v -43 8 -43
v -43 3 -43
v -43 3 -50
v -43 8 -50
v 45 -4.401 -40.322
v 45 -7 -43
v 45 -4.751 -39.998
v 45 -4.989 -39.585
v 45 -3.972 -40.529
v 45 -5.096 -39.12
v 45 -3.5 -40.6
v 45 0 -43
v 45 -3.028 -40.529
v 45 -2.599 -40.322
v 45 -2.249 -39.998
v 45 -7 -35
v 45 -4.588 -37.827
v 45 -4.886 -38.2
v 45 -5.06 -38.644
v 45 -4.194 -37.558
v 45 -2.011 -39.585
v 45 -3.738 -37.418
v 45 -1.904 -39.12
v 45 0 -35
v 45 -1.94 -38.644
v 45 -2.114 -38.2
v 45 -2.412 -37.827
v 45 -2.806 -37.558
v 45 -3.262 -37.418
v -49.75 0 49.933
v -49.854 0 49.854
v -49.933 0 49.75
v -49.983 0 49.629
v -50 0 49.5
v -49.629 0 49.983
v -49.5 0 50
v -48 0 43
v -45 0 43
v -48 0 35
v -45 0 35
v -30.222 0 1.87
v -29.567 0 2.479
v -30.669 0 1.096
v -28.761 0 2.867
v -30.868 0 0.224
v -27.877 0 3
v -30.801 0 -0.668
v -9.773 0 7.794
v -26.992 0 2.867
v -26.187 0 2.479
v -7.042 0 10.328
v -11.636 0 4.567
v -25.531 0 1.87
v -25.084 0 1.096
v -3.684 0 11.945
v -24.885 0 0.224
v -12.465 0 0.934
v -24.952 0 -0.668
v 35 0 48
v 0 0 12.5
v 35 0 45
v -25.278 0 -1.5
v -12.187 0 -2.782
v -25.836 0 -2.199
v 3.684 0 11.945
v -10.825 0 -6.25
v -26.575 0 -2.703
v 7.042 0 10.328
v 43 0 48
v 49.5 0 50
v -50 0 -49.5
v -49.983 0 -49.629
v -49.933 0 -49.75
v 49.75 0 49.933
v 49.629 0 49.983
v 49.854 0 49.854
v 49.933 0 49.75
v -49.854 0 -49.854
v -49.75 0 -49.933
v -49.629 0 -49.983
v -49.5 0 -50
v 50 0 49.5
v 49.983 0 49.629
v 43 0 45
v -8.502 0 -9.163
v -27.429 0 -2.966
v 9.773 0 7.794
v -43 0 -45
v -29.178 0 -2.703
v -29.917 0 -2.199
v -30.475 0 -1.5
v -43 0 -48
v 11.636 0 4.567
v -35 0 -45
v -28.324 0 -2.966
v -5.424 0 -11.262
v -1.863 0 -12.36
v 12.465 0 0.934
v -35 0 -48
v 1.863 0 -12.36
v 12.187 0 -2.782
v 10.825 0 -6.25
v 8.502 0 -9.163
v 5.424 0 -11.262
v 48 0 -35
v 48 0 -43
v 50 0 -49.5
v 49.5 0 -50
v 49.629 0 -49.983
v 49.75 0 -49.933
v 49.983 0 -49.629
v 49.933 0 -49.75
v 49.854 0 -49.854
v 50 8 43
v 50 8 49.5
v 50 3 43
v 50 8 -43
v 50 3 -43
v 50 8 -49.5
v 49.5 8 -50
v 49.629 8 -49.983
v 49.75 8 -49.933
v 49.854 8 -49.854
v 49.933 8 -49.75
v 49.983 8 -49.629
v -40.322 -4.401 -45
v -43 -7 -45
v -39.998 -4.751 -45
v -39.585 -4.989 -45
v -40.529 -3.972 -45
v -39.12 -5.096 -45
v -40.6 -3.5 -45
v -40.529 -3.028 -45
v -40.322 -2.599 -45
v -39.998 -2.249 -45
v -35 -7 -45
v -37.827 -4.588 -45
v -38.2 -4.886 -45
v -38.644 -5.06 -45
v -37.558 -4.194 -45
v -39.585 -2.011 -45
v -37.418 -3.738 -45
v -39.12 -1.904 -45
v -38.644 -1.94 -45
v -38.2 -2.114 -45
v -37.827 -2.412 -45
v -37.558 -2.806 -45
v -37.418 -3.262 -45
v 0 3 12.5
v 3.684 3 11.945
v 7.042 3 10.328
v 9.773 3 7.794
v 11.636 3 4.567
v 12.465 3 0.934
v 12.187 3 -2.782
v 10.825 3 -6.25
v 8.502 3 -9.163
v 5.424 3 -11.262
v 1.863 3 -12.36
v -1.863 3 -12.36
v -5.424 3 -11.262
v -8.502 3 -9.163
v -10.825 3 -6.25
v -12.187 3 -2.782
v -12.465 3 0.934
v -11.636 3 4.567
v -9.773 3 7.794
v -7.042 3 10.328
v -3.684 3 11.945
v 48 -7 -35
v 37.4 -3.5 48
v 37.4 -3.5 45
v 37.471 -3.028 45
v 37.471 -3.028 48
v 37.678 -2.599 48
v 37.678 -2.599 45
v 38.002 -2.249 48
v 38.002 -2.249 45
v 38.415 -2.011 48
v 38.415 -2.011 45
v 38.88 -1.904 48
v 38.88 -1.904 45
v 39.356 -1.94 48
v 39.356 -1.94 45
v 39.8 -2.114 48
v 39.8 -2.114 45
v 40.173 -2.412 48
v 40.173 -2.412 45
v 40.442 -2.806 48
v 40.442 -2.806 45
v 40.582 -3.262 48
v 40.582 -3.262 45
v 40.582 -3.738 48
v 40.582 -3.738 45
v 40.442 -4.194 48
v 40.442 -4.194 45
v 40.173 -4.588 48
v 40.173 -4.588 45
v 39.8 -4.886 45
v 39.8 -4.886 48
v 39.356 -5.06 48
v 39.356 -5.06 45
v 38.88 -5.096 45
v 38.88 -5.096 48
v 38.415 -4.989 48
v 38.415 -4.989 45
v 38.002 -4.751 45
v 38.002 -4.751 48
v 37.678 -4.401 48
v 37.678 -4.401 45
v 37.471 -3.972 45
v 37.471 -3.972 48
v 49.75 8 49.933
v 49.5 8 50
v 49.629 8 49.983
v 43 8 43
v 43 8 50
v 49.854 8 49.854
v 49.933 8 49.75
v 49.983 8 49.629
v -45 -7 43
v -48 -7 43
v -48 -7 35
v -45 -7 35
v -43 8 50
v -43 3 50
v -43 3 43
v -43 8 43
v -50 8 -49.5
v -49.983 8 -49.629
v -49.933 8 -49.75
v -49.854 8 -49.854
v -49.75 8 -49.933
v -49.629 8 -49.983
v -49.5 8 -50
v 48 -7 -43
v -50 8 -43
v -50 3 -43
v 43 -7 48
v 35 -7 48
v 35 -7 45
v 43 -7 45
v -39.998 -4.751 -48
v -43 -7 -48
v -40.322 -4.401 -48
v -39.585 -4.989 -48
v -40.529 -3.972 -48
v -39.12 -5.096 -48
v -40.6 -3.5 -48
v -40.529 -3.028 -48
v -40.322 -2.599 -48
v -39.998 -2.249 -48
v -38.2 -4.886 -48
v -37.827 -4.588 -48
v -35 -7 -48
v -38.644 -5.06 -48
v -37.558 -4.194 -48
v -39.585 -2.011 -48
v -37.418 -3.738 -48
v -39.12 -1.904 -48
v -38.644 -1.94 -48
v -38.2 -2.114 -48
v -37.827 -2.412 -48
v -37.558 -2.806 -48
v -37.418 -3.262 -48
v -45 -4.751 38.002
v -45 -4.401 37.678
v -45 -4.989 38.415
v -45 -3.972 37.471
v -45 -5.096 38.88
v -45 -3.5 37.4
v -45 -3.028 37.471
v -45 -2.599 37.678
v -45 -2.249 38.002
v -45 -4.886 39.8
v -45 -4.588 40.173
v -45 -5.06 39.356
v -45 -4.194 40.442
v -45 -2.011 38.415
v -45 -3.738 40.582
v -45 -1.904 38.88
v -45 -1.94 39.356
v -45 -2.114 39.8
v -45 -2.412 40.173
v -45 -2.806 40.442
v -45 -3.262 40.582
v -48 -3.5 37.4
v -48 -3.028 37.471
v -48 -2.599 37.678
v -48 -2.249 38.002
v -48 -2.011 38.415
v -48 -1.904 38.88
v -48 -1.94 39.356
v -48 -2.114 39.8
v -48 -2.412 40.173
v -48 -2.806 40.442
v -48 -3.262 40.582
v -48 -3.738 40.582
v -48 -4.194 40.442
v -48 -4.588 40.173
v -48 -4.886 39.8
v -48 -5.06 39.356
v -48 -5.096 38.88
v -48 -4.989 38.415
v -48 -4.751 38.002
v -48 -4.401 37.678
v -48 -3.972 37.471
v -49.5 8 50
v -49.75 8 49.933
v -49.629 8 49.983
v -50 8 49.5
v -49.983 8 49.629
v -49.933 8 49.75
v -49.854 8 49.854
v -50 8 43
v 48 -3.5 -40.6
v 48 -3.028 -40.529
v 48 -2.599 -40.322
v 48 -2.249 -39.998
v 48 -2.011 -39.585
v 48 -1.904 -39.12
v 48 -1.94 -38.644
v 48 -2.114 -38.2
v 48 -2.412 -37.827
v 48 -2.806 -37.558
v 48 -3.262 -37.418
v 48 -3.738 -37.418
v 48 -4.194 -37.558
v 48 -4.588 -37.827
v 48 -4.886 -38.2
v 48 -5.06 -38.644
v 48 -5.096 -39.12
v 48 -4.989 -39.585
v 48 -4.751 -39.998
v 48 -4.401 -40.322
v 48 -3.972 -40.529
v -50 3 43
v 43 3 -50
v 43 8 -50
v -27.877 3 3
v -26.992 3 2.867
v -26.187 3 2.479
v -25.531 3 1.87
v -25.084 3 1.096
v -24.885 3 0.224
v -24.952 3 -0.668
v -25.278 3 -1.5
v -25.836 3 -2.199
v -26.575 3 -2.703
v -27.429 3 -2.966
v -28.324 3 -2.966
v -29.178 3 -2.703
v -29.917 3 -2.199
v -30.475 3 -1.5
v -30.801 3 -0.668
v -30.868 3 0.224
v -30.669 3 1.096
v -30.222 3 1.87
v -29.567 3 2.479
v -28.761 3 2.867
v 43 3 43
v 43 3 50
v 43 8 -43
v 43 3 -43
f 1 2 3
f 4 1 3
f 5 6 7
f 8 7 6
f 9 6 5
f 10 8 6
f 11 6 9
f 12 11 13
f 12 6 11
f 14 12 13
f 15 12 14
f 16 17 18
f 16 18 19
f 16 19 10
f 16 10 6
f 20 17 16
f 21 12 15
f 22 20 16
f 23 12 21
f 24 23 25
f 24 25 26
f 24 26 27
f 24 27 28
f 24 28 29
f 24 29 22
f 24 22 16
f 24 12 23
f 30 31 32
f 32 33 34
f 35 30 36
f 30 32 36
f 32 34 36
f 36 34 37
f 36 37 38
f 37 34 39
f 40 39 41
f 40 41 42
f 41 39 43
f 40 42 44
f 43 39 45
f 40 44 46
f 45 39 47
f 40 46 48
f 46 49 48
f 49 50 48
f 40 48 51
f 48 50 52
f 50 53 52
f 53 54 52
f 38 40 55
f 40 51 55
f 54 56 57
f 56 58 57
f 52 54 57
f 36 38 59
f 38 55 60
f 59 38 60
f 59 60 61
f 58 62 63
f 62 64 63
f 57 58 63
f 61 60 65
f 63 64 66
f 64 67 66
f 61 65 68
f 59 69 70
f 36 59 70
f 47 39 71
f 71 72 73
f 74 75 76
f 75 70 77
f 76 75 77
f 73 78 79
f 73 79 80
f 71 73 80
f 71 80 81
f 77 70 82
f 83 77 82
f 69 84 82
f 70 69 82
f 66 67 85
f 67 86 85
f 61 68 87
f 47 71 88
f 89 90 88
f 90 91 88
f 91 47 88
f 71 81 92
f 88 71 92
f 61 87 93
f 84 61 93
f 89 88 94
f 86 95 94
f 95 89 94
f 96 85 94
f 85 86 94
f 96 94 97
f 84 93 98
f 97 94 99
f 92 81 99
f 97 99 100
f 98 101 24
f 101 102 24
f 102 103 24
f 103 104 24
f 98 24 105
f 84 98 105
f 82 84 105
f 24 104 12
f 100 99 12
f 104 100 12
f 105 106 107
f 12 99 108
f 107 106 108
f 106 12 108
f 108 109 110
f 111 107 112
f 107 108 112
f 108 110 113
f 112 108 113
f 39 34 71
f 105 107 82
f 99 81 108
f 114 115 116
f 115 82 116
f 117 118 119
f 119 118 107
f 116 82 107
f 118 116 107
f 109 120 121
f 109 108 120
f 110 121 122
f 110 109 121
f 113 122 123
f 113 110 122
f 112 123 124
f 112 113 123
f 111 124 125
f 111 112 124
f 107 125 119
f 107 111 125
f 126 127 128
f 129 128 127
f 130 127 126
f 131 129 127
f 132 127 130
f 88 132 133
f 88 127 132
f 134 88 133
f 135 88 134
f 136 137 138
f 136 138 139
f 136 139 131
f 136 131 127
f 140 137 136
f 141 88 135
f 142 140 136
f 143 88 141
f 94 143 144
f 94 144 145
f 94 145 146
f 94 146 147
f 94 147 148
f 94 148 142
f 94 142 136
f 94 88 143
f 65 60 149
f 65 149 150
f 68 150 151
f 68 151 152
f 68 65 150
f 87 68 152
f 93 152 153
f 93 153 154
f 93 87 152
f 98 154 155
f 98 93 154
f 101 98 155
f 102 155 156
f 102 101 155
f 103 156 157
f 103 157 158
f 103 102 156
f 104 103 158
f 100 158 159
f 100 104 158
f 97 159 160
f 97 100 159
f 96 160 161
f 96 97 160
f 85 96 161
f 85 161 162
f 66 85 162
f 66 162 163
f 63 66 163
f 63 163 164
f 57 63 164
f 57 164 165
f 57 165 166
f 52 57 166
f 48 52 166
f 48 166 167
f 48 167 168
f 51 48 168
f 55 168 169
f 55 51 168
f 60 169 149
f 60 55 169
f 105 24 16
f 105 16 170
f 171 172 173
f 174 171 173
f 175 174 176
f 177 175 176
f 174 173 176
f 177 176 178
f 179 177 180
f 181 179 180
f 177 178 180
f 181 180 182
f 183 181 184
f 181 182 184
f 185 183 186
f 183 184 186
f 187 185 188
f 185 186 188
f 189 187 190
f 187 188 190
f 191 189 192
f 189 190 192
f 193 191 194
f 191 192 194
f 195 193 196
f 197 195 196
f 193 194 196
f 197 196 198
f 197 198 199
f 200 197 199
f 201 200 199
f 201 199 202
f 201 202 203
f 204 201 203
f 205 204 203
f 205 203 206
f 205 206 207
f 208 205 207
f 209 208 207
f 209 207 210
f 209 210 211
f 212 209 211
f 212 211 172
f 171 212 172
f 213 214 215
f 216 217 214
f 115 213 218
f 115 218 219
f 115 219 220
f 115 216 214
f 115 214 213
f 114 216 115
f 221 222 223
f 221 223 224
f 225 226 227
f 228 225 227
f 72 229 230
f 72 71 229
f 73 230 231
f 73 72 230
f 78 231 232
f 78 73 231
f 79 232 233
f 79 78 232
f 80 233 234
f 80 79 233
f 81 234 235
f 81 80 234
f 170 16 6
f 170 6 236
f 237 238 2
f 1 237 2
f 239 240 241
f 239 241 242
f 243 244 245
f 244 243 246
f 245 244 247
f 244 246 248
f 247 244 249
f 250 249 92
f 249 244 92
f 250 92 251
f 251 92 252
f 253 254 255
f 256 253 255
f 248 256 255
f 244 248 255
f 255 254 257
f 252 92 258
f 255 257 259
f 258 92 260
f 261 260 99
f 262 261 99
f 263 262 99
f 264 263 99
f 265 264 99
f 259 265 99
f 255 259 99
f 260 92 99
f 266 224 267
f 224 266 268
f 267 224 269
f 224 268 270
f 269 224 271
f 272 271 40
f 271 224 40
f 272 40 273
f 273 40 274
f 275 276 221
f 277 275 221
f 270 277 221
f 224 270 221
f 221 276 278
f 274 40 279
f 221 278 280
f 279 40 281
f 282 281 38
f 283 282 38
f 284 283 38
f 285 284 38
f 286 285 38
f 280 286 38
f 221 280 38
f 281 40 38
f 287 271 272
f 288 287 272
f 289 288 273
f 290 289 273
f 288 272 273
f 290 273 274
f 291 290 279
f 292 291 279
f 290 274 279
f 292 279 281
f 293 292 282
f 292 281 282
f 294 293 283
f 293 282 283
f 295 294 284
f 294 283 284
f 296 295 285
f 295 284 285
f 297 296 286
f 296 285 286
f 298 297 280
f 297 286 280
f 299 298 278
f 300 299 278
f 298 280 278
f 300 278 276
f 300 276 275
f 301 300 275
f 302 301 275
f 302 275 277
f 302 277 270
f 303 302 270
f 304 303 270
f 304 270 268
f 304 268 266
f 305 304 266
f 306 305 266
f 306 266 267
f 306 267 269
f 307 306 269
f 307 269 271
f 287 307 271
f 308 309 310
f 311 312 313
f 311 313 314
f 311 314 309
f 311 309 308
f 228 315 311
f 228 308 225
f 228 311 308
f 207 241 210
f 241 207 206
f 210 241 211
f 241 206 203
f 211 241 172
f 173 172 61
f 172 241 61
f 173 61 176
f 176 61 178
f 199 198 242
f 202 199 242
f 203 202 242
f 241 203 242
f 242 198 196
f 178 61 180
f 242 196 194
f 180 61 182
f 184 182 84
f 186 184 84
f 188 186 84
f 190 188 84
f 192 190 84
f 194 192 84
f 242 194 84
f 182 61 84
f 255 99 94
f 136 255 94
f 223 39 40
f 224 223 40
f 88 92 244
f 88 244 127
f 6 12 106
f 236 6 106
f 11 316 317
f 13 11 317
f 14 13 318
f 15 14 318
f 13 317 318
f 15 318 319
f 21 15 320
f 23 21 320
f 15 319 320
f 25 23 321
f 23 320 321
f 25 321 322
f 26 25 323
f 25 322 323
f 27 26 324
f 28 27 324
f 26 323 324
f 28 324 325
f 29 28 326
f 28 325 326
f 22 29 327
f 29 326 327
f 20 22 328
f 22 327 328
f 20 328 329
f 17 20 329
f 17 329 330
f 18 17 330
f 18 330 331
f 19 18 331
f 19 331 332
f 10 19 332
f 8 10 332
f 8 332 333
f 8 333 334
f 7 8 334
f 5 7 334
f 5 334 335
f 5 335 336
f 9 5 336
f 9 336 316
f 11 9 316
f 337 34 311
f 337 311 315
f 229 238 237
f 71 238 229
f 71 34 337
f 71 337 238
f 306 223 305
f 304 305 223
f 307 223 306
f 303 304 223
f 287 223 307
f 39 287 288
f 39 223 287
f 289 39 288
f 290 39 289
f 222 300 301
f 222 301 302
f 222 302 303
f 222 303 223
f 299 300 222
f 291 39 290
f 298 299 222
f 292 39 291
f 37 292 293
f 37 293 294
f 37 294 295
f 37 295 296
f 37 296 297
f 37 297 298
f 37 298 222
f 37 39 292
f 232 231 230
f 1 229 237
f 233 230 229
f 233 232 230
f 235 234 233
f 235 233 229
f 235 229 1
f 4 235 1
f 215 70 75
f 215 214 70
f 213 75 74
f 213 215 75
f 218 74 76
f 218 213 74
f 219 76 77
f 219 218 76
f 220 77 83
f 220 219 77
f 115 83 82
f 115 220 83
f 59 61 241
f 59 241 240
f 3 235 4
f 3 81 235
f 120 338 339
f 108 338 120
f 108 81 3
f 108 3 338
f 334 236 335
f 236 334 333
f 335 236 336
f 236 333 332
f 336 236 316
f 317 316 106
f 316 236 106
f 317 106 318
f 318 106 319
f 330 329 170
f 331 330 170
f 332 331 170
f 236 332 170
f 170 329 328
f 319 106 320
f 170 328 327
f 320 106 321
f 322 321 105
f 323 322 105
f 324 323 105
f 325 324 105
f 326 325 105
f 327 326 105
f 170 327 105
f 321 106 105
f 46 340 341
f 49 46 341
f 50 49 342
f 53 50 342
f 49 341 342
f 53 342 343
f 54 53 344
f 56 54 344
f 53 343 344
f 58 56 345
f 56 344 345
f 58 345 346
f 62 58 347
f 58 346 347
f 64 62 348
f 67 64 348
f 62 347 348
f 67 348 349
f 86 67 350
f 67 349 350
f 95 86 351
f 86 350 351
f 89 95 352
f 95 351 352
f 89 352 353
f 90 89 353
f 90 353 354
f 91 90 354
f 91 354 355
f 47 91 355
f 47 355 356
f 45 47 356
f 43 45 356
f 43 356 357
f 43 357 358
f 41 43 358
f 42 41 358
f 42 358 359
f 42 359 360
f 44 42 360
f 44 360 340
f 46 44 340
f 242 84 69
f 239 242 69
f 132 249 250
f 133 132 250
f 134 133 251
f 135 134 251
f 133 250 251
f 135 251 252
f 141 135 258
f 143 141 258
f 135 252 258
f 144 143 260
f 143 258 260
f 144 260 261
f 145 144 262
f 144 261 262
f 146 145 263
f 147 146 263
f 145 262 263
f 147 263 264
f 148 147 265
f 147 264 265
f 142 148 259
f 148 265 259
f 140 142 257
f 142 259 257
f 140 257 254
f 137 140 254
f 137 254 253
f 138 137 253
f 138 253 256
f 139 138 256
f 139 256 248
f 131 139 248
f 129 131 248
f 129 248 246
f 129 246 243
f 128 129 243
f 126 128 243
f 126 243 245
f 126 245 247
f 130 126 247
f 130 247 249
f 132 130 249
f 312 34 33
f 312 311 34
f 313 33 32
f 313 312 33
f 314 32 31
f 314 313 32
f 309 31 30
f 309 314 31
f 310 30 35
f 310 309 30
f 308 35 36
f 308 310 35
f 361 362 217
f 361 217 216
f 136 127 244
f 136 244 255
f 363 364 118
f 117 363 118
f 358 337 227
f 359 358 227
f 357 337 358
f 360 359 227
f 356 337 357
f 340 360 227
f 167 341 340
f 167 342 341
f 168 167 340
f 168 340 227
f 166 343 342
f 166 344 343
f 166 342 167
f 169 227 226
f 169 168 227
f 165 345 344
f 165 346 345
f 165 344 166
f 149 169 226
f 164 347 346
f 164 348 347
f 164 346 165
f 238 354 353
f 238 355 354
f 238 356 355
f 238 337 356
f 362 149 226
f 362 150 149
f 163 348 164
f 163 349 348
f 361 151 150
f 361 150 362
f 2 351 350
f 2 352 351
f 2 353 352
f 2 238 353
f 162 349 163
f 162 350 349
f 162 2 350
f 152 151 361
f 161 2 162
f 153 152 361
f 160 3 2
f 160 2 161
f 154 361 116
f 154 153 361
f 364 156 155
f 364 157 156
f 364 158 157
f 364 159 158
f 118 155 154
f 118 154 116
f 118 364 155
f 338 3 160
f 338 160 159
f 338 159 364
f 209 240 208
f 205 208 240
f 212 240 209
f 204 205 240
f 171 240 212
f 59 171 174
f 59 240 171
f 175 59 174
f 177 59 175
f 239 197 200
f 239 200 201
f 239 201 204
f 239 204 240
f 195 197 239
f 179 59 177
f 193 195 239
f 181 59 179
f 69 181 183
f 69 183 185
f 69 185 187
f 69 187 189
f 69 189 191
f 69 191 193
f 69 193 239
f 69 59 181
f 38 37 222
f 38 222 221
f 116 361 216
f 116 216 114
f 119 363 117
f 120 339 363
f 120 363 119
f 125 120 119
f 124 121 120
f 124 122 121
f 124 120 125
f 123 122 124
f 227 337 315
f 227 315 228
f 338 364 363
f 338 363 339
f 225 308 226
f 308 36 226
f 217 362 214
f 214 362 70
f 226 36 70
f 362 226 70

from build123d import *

# Parameters (mm, degrees)
SKETCH2_W           = 100
SKETCH2_H           = 100
SKETCH2_R           = 12.5
BOSS_EXTRUDE1_DEPTH = 3
SKETCH3_W           = 7
SKETCH3_H           = 7
BOSS_EXTRUDE2_DEPTH = 5
SKETCH4_W           = 3
SKETCH4_H           = 8
SKETCH4_W_2         = 8
SKETCH4_H_2         = 3
BOSS_EXTRUDE3_DEPTH = 7
SKETCH5_R           = 1.6
CUT_EXTRUDE1_DEPTH  = 111.308657865
SKETCH8_R           = 1.6
CUT_EXTRUDE4_DEPTH  = 111.308657865
SKETCH9_R           = 3
CUT_EXTRUDE5_DEPTH  = 10
FILLET1_R           = 0.5


with BuildPart() as part:
    # Sketch2 → Boss-Extrude1 (new body)
    with BuildSketch(Plane(origin=(0, 0, 0), x_dir=(1, 0, 0), z_dir=(0, 1, 0))):
        Rectangle(SKETCH2_W, SKETCH2_H)
        with Locations(Location((0, 0, 0), (0, 0, 270))):
            Circle(SKETCH2_R, mode=Mode.SUBTRACT)
    extrude(amount=BOSS_EXTRUDE1_DEPTH)

    # Sketch3 → Boss-Extrude2 (add)
    with BuildSketch(Plane(origin=(0, 3, 0), x_dir=(1, 0, 0), z_dir=(0, 1, 0))):
        with Locations((-46.5, 46.5)):
            Rectangle(SKETCH3_W, SKETCH3_H)
        with Locations((46.5, 46.5)):
            Rectangle(SKETCH3_W, SKETCH3_H)
        with Locations((46.5, -46.5)):
            Rectangle(SKETCH3_W, SKETCH3_H)
        with Locations((-46.5, -46.5)):
            Rectangle(SKETCH3_W, SKETCH3_H)
    extrude(amount=BOSS_EXTRUDE2_DEPTH)

    # Sketch4 → Boss-Extrude3 (add)
    with BuildSketch(Plane.XZ):
        with Locations((46.5, -39)):
            Rectangle(SKETCH4_W, SKETCH4_H)
        with Locations((39, 46.5)):
            Rectangle(SKETCH4_W_2, SKETCH4_H_2)
        with Locations((-46.5, 39)):
            Rectangle(SKETCH4_W, SKETCH4_H)
        with Locations((-39, -46.5)):
            Rectangle(SKETCH4_W_2, SKETCH4_H_2)
    extrude(amount=BOSS_EXTRUDE3_DEPTH)

    # Sketch5 → Cut-Extrude1 (cut, through all)
    with BuildSketch(Plane(origin=(0, 0, -48), x_dir=(-1, 0, 0), z_dir=(0, 0, -1))):
        with Locations((39, -3.5)):
            Circle(SKETCH5_R)
        with Locations((-39, -3.5)):
            Circle(SKETCH5_R)
    extrude(amount=-CUT_EXTRUDE1_DEPTH, mode=Mode.SUBTRACT)

    # Sketch8 → Cut-Extrude4 (cut, through all)
    with BuildSketch(Plane(origin=(48, 0, 0), x_dir=(0, 0, -1), z_dir=(1, 0, 0))):
        with Locations((-39, -3.5)):
            Circle(SKETCH8_R)
        with Locations((39, -3.5)):
            Circle(SKETCH8_R)
    extrude(amount=-CUT_EXTRUDE4_DEPTH, mode=Mode.SUBTRACT)

    # Sketch9 → Cut-Extrude5 (cut)
    with BuildSketch(Plane(origin=(0, 3, 0), x_dir=(1, 0, 0), z_dir=(0, 1, 0))):
        with Locations(Location((-27.876571837, 0, 0), (0, 0, 270))):
            Circle(SKETCH9_R)
    extrude(amount=-CUT_EXTRUDE5_DEPTH, mode=Mode.SUBTRACT)

    # Fillet1
    fillet1_edges = [part.edges().sort_by_distance(p)[0] for p in [
        (-50, 4, 50),
        (-50, 4, -50),
        (50, 4, -50),
        (50, 4, 50),
    ]]
    fillet(fillet1_edges, radius=FILLET1_R)


solid = part.part
